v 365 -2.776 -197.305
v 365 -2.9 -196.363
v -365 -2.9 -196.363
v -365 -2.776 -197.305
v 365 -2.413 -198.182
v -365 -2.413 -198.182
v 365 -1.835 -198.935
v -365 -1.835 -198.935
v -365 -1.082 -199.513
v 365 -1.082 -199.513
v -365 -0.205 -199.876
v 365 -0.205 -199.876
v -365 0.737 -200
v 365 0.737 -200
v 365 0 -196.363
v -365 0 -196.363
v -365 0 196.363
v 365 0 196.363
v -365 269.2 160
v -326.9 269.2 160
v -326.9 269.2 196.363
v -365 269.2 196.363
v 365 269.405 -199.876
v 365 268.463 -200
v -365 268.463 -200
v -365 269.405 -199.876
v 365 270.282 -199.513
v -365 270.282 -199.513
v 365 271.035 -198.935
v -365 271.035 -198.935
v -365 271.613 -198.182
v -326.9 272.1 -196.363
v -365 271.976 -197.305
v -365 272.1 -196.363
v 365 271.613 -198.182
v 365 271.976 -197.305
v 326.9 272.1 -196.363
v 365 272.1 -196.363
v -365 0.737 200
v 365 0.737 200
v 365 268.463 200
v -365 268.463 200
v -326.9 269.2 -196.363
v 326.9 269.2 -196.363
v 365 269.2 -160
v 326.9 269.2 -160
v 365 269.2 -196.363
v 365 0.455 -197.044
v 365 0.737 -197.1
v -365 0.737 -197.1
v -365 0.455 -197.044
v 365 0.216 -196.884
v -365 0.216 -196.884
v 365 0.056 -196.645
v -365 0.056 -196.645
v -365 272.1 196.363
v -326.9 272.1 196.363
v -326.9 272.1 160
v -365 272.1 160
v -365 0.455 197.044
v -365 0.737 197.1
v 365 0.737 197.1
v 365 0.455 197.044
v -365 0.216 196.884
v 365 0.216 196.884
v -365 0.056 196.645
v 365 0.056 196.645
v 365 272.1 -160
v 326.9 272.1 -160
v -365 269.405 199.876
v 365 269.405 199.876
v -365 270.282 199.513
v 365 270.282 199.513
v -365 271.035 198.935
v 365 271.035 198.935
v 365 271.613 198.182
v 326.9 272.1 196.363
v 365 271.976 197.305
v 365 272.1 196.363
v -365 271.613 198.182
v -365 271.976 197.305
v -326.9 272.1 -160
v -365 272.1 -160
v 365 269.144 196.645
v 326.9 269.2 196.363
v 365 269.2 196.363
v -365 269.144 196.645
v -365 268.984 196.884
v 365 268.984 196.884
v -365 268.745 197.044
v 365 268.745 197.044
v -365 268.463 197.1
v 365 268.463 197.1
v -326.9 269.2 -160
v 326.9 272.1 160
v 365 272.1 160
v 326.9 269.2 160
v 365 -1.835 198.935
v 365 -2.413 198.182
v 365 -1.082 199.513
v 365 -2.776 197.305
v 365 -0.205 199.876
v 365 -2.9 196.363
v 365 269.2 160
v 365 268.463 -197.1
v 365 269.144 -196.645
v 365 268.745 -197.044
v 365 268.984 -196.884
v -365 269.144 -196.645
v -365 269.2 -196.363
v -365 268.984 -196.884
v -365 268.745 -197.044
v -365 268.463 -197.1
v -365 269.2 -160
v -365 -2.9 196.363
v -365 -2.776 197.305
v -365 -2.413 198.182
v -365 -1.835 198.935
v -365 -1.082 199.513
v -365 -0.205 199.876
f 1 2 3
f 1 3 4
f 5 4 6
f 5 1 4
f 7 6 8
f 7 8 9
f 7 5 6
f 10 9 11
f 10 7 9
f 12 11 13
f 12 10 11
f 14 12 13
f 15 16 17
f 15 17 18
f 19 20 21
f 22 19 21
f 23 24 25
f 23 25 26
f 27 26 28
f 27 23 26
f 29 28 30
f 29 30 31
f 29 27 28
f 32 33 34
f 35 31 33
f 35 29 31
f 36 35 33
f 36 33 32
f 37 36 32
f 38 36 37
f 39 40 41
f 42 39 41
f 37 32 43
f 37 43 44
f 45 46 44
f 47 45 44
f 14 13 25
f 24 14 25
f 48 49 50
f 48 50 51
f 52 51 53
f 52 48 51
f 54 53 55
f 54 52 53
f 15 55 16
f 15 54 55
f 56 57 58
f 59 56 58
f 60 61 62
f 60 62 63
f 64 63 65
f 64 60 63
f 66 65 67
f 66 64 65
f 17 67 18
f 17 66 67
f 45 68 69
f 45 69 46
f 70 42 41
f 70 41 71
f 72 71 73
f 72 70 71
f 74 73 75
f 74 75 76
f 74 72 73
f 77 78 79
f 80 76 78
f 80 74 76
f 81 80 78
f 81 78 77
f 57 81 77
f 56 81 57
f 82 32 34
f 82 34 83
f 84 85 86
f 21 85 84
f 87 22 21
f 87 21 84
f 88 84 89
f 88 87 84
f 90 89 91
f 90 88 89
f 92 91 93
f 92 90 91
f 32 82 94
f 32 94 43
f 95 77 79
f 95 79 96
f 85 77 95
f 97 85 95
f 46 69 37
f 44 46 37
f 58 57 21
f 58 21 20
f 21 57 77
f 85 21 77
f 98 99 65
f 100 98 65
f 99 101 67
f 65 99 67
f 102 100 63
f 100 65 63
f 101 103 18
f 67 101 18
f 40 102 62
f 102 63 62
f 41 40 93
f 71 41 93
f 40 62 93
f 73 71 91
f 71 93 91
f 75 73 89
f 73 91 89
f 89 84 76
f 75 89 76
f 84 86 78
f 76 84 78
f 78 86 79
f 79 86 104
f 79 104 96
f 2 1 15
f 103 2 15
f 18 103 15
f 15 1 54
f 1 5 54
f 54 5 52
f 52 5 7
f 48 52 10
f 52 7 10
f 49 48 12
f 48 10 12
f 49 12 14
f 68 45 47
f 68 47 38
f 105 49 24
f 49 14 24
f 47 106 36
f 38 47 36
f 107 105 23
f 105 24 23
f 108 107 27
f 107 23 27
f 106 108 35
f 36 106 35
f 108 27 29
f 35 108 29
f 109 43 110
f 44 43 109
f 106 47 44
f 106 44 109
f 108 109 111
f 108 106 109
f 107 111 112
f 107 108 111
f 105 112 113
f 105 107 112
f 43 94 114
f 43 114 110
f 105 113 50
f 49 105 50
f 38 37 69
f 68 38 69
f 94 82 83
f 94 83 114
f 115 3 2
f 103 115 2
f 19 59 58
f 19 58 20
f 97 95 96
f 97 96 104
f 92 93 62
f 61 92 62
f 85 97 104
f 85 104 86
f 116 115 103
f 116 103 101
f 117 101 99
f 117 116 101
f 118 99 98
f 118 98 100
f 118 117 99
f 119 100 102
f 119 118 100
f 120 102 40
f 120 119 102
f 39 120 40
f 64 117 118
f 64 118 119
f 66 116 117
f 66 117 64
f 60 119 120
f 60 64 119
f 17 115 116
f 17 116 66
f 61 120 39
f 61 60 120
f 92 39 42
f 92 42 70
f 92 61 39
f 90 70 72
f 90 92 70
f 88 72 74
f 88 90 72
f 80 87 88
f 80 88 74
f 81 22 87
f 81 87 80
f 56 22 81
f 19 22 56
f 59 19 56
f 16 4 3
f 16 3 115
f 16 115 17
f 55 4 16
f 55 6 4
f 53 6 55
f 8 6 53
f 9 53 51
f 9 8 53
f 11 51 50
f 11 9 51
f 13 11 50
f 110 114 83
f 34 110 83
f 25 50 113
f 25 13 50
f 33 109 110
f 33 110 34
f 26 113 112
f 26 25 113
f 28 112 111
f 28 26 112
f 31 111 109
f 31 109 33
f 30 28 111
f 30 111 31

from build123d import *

# Parameters (mm, degrees)
CROQUIS1_W                         = 730
CROQUIS1_H                         = 400
BRIDA_BASE1_DEPTH                  = 2.9
BRIDA_DE_ARISTA1_STRIP_W           = 13.0732
BRIDA_DE_ARISTA1_STRIP_H           = 2.9
BRIDA_DE_ARISTA1_STRIP_CUT_DEPTH   = 730
BRIDA_DE_ARISTA1_STRIP_2_W         = 13.0732
BRIDA_DE_ARISTA1_STRIP_2_H         = 2.9
BRIDA_DE_ARISTA1_STRIP_CUT_2_DEPTH = 730
BRIDA_DE_ARISTA1_DEPTH             = 730
BRIDA_DE_ARISTA1_BEND_DEPTH        = 730
BRIDA_DE_ARISTA2_STRIP_W           = 13.0732
BRIDA_DE_ARISTA2_STRIP_H           = 2.9
BRIDA_DE_ARISTA2_STRIP_CUT_DEPTH   = 730
BRIDA_DE_ARISTA2_STRIP_2_W         = 13.0732
BRIDA_DE_ARISTA2_STRIP_2_H         = 2.9
BRIDA_DE_ARISTA2_STRIP_CUT_2_DEPTH = 730
BRIDA_DE_ARISTA2_DEPTH             = 730
BRIDA_DE_ARISTA2_BEND_DEPTH        = 730
CROQUIS18_W                        = 653.8
CROQUIS18_H                        = 36.3634
CORTAR_EXTRUIR1_DEPTH              = 4


# Sheet-metal steps are written as plain solids
with BuildPart() as part:
    # Croquis1 → Brida base1 (new body)
    with BuildSketch(Plane(origin=(0, 0, 0), x_dir=(1, 0, 0), z_dir=(0, 1, 0))):
        Rectangle(CROQUIS1_W, CROQUIS1_H)
    extrude(amount=-BRIDA_BASE1_DEPTH)

    # Brida de arista1 strip (across the edge) → Brida de arista1 strip cut (cut)
    with BuildSketch(Plane(origin=(365, 0, -200), x_dir=(0, 0, 1), z_dir=(-1, 0, 0))):
        with Locations((-2.9, -1.45)):
            Rectangle(BRIDA_DE_ARISTA1_STRIP_W, BRIDA_DE_ARISTA1_STRIP_H)
    extrude(amount=BRIDA_DE_ARISTA1_STRIP_CUT_DEPTH, mode=Mode.SUBTRACT)

    # Brida de arista1 strip 2 (across the edge) → Brida de arista1 strip cut 2 (cut)
    with BuildSketch(Plane(origin=(-365, 0, 200), x_dir=(0, 0, -1), z_dir=(1, 0, 0))):
        with Locations((-2.9, -1.45)):
            Rectangle(BRIDA_DE_ARISTA1_STRIP_2_W, BRIDA_DE_ARISTA1_STRIP_2_H)
    extrude(amount=BRIDA_DE_ARISTA1_STRIP_CUT_2_DEPTH, mode=Mode.SUBTRACT)

    # Brida de arista1 section (across the edge) → Brida de arista1 (add)
    with BuildSketch(Plane(origin=(365, 0, -200), x_dir=(0, 0, 1), z_dir=(-1, 0, 0))):
        with BuildLine():
            Line((0, 0.7366), (0, 272.1))
            Line((0, 272.1), (2.9, 272.1))
            Line((2.9, 272.1), (2.9, 0.7366))
            ThreePointArc((2.9, 0.7366), (3.115745145, 0.215745145), (3.6366, 0))
            Line((3.6366, 0), (3.6366, -2.9))
            ThreePointArc((3.6366, -2.9), (1.06513548, -1.83486452), (0, 0.7366))
        make_face()
    extrude(amount=BRIDA_DE_ARISTA1_DEPTH)

    # Brida de arista1 section 2 (across the edge) → Brida de arista1 bend (add)
    with BuildSketch(Plane(origin=(-365, 0, 200), x_dir=(0, 0, -1), z_dir=(1, 0, 0))):
        with BuildLine():
            Line((0, 0.7366), (0, 272.1))
            Line((0, 272.1), (2.9, 272.1))
            Line((2.9, 272.1), (2.9, 0.7366))
            ThreePointArc((2.9, 0.7366), (3.115745145, 0.215745145), (3.6366, 0))
            Line((3.6366, 0), (3.6366, -2.9))
            ThreePointArc((3.6366, -2.9), (1.06513548, -1.83486452), (0, 0.7366))
        make_face()
    extrude(amount=BRIDA_DE_ARISTA1_BEND_DEPTH)

    # Brida de arista2 strip (across the edge) → Brida de arista2 strip cut (cut)
    with BuildSketch(Plane(origin=(365, 272.1, -197.1), x_dir=(0, -1, 0), z_dir=(-1, 0, 0))):
        with Locations((-2.9, -1.45)):
            Rectangle(BRIDA_DE_ARISTA2_STRIP_W, BRIDA_DE_ARISTA2_STRIP_H)
    extrude(amount=BRIDA_DE_ARISTA2_STRIP_CUT_DEPTH, mode=Mode.SUBTRACT)

    # Brida de arista2 strip 2 (across the edge) → Brida de arista2 strip cut 2 (cut)
    with BuildSketch(Plane(origin=(-365, 272.1, 197.1), x_dir=(0, -1, 0), z_dir=(1, 0, 0))):
        with Locations((-2.9, -1.45)):
            Rectangle(BRIDA_DE_ARISTA2_STRIP_2_W, BRIDA_DE_ARISTA2_STRIP_2_H)
    extrude(amount=BRIDA_DE_ARISTA2_STRIP_CUT_2_DEPTH, mode=Mode.SUBTRACT)

    # Brida de arista2 section (across the edge) → Brida de arista2 (add)
    with BuildSketch(Plane(origin=(365, 272.1, -197.1), x_dir=(0, -1, 0), z_dir=(-1, 0, 0))):
        with BuildLine():
            Line((0, 0.7366), (0, 37.1))
            Line((0, 37.1), (2.9, 37.1))
            Line((2.9, 37.1), (2.9, 0.7366))
            ThreePointArc((2.9, 0.7366), (3.115745145, 0.215745145), (3.6366, 0))
            Line((3.6366, 0), (3.6366, -2.9))
            ThreePointArc((3.6366, -2.9), (1.06513548, -1.83486452), (0, 0.7366))
        make_face()
    extrude(amount=BRIDA_DE_ARISTA2_DEPTH)

    # Brida de arista2 section 2 (across the edge) → Brida de arista2 bend (add)
    with BuildSketch(Plane(origin=(-365, 272.1, 197.1), x_dir=(0, -1, 0), z_dir=(1, 0, 0))):
        with BuildLine():
            Line((0, 0.7366), (0, 37.1))
            Line((0, 37.1), (2.9, 37.1))
            Line((2.9, 37.1), (2.9, 0.7366))
            ThreePointArc((2.9, 0.7366), (3.115745145, 0.215745145), (3.6366, 0))
            Line((3.6366, 0), (3.6366, -2.9))
            ThreePointArc((3.6366, -2.9), (1.06513548, -1.83486452), (0, 0.7366))
        make_face()
    extrude(amount=BRIDA_DE_ARISTA2_BEND_DEPTH)

    # Croquis18 → Cortar-Extruir1 (cut)
    with BuildSketch(Plane(origin=(0, 272.1, 0), x_dir=(1, 0, 0), z_dir=(0, 1, 0))):
        with Locations((0, -178.1817)):
            Rectangle(CROQUIS18_W, CROQUIS18_H)
        with Locations((0, 178.1817)):
            Rectangle(CROQUIS18_W, CROQUIS18_H)
    extrude(amount=-CORTAR_EXTRUIR1_DEPTH, mode=Mode.SUBTRACT)


solid = part.part
